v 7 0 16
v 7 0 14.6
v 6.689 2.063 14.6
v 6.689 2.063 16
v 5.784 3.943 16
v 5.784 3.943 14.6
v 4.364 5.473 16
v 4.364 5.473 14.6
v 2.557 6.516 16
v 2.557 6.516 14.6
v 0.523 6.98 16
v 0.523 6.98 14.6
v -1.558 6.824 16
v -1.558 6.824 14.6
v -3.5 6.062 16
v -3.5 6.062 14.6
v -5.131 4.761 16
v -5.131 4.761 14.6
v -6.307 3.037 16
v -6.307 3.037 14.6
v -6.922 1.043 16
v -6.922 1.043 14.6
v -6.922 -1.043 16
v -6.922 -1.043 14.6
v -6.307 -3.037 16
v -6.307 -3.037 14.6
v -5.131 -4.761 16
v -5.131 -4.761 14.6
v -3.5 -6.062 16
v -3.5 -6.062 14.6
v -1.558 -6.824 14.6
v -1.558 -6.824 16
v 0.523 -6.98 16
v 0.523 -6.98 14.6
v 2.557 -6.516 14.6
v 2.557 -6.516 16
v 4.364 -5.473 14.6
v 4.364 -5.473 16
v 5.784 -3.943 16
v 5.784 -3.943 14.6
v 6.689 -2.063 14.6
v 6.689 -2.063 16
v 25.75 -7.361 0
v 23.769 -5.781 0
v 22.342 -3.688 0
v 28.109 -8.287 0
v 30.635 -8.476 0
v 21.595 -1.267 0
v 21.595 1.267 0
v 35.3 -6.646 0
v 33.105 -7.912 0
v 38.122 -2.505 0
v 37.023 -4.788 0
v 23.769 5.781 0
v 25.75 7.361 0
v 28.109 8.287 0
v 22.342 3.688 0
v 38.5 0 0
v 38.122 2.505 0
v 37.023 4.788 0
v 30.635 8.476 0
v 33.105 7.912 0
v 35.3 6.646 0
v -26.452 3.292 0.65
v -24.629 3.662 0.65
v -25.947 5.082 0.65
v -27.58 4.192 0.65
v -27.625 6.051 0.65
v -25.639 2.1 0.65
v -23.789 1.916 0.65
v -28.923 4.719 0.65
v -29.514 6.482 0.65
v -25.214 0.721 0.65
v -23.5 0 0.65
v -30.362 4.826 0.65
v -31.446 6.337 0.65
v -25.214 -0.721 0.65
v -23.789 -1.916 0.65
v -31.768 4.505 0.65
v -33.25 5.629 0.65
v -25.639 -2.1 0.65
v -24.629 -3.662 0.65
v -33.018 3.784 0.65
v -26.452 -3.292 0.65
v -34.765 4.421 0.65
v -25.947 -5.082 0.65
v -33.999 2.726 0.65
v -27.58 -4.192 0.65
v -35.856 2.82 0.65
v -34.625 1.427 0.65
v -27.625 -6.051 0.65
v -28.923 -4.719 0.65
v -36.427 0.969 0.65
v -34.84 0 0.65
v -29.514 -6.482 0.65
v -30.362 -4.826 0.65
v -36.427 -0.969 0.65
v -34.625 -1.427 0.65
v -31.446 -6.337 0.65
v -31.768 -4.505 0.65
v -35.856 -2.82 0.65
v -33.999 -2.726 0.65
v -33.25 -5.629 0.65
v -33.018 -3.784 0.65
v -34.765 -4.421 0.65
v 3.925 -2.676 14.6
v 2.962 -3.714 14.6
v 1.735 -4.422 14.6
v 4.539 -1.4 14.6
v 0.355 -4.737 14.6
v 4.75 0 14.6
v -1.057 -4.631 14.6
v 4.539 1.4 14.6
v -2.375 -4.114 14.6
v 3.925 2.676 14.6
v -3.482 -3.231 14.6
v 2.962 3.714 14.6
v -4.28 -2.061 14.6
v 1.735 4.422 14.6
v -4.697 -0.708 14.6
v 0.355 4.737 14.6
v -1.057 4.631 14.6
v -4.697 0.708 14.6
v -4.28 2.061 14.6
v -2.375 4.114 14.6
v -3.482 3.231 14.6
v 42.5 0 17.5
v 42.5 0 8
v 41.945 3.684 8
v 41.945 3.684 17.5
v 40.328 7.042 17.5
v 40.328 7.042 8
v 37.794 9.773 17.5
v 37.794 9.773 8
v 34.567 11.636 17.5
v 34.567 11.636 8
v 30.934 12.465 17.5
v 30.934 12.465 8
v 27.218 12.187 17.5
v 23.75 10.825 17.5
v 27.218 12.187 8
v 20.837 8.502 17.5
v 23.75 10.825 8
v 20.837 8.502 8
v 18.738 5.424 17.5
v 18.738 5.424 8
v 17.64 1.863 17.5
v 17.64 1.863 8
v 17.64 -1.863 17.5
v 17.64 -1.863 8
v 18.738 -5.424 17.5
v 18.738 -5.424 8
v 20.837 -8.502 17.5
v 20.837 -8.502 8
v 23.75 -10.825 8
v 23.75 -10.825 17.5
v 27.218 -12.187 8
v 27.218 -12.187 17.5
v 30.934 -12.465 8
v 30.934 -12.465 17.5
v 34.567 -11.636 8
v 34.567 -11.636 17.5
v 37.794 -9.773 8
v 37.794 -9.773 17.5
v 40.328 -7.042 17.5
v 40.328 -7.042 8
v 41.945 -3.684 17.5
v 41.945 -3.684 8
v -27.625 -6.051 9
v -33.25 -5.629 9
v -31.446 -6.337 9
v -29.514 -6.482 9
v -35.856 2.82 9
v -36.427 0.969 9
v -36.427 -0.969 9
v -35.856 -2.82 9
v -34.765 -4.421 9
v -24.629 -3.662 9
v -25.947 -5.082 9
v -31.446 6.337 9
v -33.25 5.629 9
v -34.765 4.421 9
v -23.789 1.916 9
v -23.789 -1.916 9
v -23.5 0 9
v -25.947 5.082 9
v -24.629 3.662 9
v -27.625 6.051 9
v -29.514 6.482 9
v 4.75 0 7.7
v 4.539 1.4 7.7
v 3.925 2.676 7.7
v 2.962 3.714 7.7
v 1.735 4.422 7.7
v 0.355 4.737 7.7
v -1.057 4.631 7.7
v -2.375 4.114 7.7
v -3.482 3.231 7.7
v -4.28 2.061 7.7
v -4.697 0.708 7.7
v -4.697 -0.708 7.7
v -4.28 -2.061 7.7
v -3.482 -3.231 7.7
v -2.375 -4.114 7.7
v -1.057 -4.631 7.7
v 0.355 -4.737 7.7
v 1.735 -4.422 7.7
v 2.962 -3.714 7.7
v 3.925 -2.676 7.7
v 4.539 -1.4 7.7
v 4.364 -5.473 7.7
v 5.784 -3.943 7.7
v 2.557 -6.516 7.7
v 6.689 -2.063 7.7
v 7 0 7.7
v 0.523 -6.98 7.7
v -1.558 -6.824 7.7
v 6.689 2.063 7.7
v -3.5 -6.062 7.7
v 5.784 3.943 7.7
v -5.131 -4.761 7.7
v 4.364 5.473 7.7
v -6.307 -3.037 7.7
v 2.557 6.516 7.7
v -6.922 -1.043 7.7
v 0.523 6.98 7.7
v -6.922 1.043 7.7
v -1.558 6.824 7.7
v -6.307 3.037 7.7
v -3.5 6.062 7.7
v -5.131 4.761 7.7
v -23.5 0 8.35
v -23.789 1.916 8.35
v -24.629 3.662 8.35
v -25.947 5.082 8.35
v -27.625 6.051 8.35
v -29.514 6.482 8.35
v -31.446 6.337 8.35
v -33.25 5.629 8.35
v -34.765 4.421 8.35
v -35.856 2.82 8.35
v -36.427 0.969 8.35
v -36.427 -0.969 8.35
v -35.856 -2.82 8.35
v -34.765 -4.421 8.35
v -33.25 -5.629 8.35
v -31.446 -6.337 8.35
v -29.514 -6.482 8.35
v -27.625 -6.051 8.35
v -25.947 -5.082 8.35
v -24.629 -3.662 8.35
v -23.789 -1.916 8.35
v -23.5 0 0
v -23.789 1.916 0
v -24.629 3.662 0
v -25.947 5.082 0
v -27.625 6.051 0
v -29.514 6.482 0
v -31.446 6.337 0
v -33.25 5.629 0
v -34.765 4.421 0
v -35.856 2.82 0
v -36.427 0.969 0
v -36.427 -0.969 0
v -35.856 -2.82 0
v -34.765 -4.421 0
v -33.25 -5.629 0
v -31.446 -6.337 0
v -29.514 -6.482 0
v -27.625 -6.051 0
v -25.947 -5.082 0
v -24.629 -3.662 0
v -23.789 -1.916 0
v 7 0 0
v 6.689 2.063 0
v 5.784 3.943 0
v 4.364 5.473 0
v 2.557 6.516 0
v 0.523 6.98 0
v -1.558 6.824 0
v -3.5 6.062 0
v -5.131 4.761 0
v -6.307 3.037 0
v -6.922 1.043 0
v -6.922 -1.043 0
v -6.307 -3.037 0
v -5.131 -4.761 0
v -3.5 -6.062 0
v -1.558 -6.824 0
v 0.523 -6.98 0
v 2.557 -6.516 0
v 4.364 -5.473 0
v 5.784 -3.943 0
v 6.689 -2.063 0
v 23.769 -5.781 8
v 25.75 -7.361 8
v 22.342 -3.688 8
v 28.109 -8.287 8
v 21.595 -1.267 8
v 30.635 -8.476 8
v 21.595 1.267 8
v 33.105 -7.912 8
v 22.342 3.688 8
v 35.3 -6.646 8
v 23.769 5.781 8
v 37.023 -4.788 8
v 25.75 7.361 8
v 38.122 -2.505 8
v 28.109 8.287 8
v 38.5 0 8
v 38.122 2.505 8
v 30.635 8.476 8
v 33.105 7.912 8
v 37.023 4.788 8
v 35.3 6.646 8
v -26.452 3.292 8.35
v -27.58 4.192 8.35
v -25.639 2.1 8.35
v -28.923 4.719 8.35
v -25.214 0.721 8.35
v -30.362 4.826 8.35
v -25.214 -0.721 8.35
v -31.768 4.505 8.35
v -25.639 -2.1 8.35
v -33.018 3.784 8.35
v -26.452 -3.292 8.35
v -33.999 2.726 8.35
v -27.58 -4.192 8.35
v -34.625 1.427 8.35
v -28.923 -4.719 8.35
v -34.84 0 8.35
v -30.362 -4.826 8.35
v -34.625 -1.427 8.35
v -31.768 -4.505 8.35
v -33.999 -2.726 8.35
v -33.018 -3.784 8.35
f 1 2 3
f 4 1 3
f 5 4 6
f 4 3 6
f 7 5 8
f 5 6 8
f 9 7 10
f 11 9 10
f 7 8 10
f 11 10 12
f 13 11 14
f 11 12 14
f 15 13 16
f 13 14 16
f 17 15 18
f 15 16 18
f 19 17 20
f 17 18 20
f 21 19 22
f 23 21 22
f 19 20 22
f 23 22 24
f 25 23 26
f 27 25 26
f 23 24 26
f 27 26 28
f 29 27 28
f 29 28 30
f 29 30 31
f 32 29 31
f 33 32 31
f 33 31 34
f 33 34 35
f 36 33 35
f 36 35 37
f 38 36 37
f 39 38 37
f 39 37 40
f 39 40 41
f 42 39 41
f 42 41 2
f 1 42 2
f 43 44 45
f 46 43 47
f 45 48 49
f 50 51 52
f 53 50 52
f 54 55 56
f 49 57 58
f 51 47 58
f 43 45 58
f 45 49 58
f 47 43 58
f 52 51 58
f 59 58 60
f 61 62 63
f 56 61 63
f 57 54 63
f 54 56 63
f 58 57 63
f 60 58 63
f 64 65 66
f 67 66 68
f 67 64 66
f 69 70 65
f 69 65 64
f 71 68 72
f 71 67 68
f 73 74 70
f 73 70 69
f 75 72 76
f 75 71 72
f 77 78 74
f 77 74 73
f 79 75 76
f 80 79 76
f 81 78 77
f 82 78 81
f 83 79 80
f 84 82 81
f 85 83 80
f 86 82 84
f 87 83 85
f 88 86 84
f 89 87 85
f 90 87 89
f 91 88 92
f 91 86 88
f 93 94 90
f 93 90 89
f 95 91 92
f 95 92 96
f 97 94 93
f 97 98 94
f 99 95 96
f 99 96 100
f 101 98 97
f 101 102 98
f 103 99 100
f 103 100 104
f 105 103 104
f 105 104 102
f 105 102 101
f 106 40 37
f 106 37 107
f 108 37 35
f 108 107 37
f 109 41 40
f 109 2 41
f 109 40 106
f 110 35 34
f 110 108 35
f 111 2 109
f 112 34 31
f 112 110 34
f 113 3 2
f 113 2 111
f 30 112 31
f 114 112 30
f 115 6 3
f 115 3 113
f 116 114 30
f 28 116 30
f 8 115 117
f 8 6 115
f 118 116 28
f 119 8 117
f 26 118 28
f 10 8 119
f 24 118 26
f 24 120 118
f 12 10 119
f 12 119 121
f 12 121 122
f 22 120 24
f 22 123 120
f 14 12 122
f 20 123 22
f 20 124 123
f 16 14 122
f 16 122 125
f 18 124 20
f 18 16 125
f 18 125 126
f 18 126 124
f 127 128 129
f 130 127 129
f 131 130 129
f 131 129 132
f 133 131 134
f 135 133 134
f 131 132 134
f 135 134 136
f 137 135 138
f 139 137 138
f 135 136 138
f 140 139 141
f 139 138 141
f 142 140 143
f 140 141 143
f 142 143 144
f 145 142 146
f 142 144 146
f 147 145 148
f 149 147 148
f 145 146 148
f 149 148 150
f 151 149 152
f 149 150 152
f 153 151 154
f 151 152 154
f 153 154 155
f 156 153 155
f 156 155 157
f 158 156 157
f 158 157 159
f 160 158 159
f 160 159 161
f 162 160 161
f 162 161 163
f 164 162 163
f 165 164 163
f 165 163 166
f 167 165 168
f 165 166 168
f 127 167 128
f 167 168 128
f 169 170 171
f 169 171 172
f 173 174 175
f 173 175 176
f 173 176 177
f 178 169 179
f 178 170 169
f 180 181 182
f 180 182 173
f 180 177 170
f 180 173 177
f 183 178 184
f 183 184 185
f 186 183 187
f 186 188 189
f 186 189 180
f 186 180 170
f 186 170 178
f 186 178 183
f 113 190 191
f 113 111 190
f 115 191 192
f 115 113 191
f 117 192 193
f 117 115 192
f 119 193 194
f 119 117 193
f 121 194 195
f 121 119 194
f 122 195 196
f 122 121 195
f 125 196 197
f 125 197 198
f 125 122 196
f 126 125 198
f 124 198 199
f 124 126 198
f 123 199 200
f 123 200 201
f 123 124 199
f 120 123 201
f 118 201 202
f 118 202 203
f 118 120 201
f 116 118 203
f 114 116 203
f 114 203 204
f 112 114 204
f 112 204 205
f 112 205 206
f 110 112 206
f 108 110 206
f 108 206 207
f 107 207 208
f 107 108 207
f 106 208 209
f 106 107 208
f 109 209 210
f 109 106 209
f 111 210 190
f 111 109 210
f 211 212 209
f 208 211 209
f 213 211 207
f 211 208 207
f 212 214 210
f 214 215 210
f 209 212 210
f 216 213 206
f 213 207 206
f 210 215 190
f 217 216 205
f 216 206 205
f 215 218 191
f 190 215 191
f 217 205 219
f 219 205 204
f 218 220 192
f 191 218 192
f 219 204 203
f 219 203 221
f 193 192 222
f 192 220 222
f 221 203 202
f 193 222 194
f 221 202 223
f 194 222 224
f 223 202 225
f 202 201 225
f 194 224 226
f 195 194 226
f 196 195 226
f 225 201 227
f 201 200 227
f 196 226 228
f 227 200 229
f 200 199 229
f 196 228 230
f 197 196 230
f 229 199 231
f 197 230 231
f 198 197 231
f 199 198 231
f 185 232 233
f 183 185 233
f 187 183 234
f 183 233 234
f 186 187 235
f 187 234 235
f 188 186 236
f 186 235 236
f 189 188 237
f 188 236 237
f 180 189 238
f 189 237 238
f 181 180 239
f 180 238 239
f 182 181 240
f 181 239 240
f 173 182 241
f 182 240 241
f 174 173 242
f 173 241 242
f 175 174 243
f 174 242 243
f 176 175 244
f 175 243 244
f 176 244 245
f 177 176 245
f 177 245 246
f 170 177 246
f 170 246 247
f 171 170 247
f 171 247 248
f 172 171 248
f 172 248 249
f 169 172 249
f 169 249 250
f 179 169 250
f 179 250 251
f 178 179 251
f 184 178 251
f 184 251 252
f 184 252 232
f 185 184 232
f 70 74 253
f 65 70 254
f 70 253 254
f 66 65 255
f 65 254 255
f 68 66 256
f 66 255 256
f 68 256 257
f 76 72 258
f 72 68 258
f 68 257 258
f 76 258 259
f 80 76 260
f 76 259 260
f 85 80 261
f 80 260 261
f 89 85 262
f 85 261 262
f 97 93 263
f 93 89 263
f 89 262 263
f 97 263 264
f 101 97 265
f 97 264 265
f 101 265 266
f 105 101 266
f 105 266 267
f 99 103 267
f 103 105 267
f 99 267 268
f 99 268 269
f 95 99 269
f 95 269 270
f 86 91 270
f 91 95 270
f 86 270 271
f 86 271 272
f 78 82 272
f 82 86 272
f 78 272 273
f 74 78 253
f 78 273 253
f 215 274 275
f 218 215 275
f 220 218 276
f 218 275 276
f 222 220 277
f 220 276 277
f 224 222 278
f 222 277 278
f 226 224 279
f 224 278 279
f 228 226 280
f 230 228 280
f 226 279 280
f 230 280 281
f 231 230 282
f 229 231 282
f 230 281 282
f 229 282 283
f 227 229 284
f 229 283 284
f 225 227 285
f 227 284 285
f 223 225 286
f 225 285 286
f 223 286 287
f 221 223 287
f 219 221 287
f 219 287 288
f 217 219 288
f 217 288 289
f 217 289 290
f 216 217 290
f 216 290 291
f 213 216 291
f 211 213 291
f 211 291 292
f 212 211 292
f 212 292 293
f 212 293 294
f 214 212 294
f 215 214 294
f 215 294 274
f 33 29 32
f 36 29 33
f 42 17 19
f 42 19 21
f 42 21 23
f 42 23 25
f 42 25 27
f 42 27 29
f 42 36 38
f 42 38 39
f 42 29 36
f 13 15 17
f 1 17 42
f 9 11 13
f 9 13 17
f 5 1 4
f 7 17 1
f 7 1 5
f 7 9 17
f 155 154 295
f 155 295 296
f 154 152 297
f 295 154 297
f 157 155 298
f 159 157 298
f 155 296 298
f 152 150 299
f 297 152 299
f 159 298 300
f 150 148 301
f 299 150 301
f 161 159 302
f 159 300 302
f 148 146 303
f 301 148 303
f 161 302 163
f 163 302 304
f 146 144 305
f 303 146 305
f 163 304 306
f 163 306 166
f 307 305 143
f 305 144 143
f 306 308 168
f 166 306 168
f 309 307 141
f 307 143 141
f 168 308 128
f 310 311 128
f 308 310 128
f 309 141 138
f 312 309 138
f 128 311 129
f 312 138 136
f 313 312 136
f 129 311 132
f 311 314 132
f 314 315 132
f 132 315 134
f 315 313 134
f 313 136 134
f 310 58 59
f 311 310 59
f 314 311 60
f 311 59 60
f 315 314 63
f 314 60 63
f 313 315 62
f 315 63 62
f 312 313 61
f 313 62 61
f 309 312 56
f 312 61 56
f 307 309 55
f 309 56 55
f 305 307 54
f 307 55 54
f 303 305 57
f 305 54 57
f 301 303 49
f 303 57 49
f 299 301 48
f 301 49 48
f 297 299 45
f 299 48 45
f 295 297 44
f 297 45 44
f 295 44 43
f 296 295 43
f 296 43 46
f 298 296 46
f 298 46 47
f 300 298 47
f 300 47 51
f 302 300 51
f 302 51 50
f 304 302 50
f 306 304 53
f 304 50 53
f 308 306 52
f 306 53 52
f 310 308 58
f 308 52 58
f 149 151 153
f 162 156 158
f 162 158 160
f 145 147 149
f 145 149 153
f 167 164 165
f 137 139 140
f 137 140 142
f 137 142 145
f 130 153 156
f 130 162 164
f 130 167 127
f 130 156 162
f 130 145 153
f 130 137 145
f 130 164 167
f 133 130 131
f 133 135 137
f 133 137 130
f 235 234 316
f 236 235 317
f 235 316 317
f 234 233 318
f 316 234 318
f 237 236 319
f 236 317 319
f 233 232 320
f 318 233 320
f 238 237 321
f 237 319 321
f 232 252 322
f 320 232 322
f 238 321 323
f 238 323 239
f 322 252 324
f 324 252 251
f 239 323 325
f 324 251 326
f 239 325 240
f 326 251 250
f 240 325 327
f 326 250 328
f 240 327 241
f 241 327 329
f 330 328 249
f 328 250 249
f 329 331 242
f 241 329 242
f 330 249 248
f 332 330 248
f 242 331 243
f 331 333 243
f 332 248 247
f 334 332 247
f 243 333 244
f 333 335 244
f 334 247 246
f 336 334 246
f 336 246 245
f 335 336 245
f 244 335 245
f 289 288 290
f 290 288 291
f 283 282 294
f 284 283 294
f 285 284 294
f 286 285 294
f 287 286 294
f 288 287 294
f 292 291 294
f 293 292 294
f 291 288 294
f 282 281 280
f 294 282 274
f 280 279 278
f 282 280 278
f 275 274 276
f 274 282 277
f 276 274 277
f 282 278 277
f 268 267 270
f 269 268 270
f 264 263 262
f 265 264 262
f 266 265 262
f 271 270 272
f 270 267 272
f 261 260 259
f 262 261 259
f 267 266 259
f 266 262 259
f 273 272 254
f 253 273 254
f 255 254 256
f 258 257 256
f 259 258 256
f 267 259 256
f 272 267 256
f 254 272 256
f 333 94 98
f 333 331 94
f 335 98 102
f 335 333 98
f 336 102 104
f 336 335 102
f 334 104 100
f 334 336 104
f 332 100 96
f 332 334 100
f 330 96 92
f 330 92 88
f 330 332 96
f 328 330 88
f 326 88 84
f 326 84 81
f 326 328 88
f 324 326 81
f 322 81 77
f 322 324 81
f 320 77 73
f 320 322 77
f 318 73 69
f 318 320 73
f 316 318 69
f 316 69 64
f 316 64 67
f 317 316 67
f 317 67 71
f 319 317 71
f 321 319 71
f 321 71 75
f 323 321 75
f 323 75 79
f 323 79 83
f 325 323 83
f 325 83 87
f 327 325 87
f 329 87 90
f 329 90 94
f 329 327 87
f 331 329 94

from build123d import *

# Parameters (mm, degrees)
F0_R     = 7
F1_DEPTH = 16
F2_W     = 2.25
F2_H     = 6.9
F4_R     = 8.5
F5_DEPTH = 8
F6_R     = 12.5
F6_R_2   = 8.5
F7_DEPTH = 9.5
F8_R     = 6.5
F9_DEPTH = 9
F10_W    = 1.66
F10_H    = 7.7


with BuildPart() as f1:
    # F0 (on Top) → F1 (new body)
    with BuildSketch(Plane.XY):
        Circle(F0_R)
    extrude(amount=F1_DEPTH)

    # F2 (on Front) → F3 (revolve, cut)
    with BuildSketch(Plane.XZ):
        with Locations((5.875, 11.15)):
            Rectangle(F2_W, F2_H)
    revolve(axis=Axis((0, 0, 8.171172), (0, 0, 1)), mode=Mode.SUBTRACT)


with BuildPart() as f5:
    # F4 (on Top) → F5 (new body)
    with BuildSketch(Plane.XY):
        with Locations((30, 0)):
            Circle(F4_R)
    extrude(amount=F5_DEPTH)

    # F6 (on face) → F7 (join)
    with BuildSketch(Plane.XY.offset(8)):
        with Locations((30, 0)):
            Circle(F6_R)
        with Locations((30, 0)):
            Circle(F6_R_2, mode=Mode.SUBTRACT)
        with Locations((30, 0)):
            Circle(F6_R_2)
    extrude(amount=F7_DEPTH)


with BuildPart() as f9:
    # F8 (on Top) → F9 (new body)
    with BuildSketch(Plane.XY):
        with Locations((-30, 0)):
            Circle(F8_R)
    extrude(amount=F9_DEPTH)

    # F10 (on Front) → F11 (revolve, cut)
    with BuildSketch(Plane.XZ):
        with Locations((-35.67, 4.5)):
            Rectangle(F10_W, F10_H)
    revolve(axis=Axis((-30, 0, 3.813123), (0, 0, 1)), mode=Mode.SUBTRACT)


solid = Compound([f1.part, f5.part, f9.part])
